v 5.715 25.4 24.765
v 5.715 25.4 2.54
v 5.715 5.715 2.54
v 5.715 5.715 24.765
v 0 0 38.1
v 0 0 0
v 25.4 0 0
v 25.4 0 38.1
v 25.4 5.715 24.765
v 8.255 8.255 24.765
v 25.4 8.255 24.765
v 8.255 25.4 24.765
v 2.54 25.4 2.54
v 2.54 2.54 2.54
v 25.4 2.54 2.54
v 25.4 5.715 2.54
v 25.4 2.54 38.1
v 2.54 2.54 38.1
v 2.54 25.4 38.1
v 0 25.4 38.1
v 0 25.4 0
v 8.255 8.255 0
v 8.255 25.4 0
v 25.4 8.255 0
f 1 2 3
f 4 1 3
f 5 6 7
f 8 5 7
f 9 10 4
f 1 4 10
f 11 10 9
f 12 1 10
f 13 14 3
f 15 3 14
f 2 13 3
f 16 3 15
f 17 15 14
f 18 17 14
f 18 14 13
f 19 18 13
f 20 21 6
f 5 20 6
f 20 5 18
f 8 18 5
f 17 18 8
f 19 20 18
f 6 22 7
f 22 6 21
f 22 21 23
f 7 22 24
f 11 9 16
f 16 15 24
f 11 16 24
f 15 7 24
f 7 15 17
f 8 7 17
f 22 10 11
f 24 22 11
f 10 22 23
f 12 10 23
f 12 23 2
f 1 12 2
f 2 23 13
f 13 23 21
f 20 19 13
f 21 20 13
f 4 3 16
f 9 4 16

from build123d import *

# Parameters (mm, degrees)
F0_W     = 2.54
F0_H     = 17.145
F0_W_2   = 3.175
F0_H_2   = 2.54
F0_H_3   = 3.175
F0_W_3   = 17.145
F1_DEPTH = 2.54
F2_DEPTH = 24.765
F3_DEPTH = 38.1


with BuildPart() as f1:
    # F0 (on Top) → F1 (new body)
    with BuildSketch(Plane.XY):
        with Locations((1.27, 16.8275)):
            Rectangle(F0_W, F0_H)
        with Locations((4.1275, 16.8275)):
            Rectangle(F0_W_2, F0_H)
        with Locations((6.985, 16.8275)):
            Rectangle(F0_W, F0_H)
        with Locations((1.27, 6.985)):
            Rectangle(F0_W, F0_H_2)
        with Locations((1.27, 4.1275)):
            Rectangle(F0_W, F0_H_3)
        with Locations((1.27, 1.27)):
            Rectangle(F0_W, F0_H_2)
        with Locations((4.1275, 1.27)):
            Rectangle(F0_W_2, F0_H_2)
        with Locations((4.1275, 4.1275)):
            Rectangle(F0_W_2, F0_H_3)
        with Locations((4.1275, 6.985)):
            Rectangle(F0_W_2, F0_H_2)
        with Locations((6.985, 4.1275)):
            Rectangle(F0_W, F0_H_3)
        with Locations((6.985, 6.985)):
            Rectangle(F0_W, F0_H_2)
        with Locations((6.985, 1.27)):
            Rectangle(F0_W, F0_H_2)
        with Locations((16.8275, 1.27)):
            Rectangle(F0_W_3, F0_H_2)
        with Locations((16.8275, 4.1275)):
            Rectangle(F0_W_3, F0_H_3)
        with Locations((16.8275, 6.985)):
            Rectangle(F0_W_3, F0_H_2)
    extrude(amount=F1_DEPTH)

    # F0 (on Top) → F2 (join)
    with BuildSketch(Plane.XY):
        with Locations((6.985, 16.8275)):
            Rectangle(F0_W, F0_H)
        with Locations((6.985, 6.985)):
            Rectangle(F0_W, F0_H_2)
        with Locations((16.8275, 6.985)):
            Rectangle(F0_W_3, F0_H_2)
    extrude(amount=F2_DEPTH)

    # F0 (on Top) → F3 (join)
    with BuildSketch(Plane.XY):
        with Locations((1.27, 16.8275)):
            Rectangle(F0_W, F0_H)
        with Locations((1.27, 6.985)):
            Rectangle(F0_W, F0_H_2)
        with Locations((1.27, 4.1275)):
            Rectangle(F0_W, F0_H_3)
        with Locations((1.27, 1.27)):
            Rectangle(F0_W, F0_H_2)
        with Locations((4.1275, 1.27)):
            Rectangle(F0_W_2, F0_H_2)
        with Locations((6.985, 1.27)):
            Rectangle(F0_W, F0_H_2)
        with Locations((16.8275, 1.27)):
            Rectangle(F0_W_3, F0_H_2)
    extrude(amount=F3_DEPTH)


solid = f1.part
